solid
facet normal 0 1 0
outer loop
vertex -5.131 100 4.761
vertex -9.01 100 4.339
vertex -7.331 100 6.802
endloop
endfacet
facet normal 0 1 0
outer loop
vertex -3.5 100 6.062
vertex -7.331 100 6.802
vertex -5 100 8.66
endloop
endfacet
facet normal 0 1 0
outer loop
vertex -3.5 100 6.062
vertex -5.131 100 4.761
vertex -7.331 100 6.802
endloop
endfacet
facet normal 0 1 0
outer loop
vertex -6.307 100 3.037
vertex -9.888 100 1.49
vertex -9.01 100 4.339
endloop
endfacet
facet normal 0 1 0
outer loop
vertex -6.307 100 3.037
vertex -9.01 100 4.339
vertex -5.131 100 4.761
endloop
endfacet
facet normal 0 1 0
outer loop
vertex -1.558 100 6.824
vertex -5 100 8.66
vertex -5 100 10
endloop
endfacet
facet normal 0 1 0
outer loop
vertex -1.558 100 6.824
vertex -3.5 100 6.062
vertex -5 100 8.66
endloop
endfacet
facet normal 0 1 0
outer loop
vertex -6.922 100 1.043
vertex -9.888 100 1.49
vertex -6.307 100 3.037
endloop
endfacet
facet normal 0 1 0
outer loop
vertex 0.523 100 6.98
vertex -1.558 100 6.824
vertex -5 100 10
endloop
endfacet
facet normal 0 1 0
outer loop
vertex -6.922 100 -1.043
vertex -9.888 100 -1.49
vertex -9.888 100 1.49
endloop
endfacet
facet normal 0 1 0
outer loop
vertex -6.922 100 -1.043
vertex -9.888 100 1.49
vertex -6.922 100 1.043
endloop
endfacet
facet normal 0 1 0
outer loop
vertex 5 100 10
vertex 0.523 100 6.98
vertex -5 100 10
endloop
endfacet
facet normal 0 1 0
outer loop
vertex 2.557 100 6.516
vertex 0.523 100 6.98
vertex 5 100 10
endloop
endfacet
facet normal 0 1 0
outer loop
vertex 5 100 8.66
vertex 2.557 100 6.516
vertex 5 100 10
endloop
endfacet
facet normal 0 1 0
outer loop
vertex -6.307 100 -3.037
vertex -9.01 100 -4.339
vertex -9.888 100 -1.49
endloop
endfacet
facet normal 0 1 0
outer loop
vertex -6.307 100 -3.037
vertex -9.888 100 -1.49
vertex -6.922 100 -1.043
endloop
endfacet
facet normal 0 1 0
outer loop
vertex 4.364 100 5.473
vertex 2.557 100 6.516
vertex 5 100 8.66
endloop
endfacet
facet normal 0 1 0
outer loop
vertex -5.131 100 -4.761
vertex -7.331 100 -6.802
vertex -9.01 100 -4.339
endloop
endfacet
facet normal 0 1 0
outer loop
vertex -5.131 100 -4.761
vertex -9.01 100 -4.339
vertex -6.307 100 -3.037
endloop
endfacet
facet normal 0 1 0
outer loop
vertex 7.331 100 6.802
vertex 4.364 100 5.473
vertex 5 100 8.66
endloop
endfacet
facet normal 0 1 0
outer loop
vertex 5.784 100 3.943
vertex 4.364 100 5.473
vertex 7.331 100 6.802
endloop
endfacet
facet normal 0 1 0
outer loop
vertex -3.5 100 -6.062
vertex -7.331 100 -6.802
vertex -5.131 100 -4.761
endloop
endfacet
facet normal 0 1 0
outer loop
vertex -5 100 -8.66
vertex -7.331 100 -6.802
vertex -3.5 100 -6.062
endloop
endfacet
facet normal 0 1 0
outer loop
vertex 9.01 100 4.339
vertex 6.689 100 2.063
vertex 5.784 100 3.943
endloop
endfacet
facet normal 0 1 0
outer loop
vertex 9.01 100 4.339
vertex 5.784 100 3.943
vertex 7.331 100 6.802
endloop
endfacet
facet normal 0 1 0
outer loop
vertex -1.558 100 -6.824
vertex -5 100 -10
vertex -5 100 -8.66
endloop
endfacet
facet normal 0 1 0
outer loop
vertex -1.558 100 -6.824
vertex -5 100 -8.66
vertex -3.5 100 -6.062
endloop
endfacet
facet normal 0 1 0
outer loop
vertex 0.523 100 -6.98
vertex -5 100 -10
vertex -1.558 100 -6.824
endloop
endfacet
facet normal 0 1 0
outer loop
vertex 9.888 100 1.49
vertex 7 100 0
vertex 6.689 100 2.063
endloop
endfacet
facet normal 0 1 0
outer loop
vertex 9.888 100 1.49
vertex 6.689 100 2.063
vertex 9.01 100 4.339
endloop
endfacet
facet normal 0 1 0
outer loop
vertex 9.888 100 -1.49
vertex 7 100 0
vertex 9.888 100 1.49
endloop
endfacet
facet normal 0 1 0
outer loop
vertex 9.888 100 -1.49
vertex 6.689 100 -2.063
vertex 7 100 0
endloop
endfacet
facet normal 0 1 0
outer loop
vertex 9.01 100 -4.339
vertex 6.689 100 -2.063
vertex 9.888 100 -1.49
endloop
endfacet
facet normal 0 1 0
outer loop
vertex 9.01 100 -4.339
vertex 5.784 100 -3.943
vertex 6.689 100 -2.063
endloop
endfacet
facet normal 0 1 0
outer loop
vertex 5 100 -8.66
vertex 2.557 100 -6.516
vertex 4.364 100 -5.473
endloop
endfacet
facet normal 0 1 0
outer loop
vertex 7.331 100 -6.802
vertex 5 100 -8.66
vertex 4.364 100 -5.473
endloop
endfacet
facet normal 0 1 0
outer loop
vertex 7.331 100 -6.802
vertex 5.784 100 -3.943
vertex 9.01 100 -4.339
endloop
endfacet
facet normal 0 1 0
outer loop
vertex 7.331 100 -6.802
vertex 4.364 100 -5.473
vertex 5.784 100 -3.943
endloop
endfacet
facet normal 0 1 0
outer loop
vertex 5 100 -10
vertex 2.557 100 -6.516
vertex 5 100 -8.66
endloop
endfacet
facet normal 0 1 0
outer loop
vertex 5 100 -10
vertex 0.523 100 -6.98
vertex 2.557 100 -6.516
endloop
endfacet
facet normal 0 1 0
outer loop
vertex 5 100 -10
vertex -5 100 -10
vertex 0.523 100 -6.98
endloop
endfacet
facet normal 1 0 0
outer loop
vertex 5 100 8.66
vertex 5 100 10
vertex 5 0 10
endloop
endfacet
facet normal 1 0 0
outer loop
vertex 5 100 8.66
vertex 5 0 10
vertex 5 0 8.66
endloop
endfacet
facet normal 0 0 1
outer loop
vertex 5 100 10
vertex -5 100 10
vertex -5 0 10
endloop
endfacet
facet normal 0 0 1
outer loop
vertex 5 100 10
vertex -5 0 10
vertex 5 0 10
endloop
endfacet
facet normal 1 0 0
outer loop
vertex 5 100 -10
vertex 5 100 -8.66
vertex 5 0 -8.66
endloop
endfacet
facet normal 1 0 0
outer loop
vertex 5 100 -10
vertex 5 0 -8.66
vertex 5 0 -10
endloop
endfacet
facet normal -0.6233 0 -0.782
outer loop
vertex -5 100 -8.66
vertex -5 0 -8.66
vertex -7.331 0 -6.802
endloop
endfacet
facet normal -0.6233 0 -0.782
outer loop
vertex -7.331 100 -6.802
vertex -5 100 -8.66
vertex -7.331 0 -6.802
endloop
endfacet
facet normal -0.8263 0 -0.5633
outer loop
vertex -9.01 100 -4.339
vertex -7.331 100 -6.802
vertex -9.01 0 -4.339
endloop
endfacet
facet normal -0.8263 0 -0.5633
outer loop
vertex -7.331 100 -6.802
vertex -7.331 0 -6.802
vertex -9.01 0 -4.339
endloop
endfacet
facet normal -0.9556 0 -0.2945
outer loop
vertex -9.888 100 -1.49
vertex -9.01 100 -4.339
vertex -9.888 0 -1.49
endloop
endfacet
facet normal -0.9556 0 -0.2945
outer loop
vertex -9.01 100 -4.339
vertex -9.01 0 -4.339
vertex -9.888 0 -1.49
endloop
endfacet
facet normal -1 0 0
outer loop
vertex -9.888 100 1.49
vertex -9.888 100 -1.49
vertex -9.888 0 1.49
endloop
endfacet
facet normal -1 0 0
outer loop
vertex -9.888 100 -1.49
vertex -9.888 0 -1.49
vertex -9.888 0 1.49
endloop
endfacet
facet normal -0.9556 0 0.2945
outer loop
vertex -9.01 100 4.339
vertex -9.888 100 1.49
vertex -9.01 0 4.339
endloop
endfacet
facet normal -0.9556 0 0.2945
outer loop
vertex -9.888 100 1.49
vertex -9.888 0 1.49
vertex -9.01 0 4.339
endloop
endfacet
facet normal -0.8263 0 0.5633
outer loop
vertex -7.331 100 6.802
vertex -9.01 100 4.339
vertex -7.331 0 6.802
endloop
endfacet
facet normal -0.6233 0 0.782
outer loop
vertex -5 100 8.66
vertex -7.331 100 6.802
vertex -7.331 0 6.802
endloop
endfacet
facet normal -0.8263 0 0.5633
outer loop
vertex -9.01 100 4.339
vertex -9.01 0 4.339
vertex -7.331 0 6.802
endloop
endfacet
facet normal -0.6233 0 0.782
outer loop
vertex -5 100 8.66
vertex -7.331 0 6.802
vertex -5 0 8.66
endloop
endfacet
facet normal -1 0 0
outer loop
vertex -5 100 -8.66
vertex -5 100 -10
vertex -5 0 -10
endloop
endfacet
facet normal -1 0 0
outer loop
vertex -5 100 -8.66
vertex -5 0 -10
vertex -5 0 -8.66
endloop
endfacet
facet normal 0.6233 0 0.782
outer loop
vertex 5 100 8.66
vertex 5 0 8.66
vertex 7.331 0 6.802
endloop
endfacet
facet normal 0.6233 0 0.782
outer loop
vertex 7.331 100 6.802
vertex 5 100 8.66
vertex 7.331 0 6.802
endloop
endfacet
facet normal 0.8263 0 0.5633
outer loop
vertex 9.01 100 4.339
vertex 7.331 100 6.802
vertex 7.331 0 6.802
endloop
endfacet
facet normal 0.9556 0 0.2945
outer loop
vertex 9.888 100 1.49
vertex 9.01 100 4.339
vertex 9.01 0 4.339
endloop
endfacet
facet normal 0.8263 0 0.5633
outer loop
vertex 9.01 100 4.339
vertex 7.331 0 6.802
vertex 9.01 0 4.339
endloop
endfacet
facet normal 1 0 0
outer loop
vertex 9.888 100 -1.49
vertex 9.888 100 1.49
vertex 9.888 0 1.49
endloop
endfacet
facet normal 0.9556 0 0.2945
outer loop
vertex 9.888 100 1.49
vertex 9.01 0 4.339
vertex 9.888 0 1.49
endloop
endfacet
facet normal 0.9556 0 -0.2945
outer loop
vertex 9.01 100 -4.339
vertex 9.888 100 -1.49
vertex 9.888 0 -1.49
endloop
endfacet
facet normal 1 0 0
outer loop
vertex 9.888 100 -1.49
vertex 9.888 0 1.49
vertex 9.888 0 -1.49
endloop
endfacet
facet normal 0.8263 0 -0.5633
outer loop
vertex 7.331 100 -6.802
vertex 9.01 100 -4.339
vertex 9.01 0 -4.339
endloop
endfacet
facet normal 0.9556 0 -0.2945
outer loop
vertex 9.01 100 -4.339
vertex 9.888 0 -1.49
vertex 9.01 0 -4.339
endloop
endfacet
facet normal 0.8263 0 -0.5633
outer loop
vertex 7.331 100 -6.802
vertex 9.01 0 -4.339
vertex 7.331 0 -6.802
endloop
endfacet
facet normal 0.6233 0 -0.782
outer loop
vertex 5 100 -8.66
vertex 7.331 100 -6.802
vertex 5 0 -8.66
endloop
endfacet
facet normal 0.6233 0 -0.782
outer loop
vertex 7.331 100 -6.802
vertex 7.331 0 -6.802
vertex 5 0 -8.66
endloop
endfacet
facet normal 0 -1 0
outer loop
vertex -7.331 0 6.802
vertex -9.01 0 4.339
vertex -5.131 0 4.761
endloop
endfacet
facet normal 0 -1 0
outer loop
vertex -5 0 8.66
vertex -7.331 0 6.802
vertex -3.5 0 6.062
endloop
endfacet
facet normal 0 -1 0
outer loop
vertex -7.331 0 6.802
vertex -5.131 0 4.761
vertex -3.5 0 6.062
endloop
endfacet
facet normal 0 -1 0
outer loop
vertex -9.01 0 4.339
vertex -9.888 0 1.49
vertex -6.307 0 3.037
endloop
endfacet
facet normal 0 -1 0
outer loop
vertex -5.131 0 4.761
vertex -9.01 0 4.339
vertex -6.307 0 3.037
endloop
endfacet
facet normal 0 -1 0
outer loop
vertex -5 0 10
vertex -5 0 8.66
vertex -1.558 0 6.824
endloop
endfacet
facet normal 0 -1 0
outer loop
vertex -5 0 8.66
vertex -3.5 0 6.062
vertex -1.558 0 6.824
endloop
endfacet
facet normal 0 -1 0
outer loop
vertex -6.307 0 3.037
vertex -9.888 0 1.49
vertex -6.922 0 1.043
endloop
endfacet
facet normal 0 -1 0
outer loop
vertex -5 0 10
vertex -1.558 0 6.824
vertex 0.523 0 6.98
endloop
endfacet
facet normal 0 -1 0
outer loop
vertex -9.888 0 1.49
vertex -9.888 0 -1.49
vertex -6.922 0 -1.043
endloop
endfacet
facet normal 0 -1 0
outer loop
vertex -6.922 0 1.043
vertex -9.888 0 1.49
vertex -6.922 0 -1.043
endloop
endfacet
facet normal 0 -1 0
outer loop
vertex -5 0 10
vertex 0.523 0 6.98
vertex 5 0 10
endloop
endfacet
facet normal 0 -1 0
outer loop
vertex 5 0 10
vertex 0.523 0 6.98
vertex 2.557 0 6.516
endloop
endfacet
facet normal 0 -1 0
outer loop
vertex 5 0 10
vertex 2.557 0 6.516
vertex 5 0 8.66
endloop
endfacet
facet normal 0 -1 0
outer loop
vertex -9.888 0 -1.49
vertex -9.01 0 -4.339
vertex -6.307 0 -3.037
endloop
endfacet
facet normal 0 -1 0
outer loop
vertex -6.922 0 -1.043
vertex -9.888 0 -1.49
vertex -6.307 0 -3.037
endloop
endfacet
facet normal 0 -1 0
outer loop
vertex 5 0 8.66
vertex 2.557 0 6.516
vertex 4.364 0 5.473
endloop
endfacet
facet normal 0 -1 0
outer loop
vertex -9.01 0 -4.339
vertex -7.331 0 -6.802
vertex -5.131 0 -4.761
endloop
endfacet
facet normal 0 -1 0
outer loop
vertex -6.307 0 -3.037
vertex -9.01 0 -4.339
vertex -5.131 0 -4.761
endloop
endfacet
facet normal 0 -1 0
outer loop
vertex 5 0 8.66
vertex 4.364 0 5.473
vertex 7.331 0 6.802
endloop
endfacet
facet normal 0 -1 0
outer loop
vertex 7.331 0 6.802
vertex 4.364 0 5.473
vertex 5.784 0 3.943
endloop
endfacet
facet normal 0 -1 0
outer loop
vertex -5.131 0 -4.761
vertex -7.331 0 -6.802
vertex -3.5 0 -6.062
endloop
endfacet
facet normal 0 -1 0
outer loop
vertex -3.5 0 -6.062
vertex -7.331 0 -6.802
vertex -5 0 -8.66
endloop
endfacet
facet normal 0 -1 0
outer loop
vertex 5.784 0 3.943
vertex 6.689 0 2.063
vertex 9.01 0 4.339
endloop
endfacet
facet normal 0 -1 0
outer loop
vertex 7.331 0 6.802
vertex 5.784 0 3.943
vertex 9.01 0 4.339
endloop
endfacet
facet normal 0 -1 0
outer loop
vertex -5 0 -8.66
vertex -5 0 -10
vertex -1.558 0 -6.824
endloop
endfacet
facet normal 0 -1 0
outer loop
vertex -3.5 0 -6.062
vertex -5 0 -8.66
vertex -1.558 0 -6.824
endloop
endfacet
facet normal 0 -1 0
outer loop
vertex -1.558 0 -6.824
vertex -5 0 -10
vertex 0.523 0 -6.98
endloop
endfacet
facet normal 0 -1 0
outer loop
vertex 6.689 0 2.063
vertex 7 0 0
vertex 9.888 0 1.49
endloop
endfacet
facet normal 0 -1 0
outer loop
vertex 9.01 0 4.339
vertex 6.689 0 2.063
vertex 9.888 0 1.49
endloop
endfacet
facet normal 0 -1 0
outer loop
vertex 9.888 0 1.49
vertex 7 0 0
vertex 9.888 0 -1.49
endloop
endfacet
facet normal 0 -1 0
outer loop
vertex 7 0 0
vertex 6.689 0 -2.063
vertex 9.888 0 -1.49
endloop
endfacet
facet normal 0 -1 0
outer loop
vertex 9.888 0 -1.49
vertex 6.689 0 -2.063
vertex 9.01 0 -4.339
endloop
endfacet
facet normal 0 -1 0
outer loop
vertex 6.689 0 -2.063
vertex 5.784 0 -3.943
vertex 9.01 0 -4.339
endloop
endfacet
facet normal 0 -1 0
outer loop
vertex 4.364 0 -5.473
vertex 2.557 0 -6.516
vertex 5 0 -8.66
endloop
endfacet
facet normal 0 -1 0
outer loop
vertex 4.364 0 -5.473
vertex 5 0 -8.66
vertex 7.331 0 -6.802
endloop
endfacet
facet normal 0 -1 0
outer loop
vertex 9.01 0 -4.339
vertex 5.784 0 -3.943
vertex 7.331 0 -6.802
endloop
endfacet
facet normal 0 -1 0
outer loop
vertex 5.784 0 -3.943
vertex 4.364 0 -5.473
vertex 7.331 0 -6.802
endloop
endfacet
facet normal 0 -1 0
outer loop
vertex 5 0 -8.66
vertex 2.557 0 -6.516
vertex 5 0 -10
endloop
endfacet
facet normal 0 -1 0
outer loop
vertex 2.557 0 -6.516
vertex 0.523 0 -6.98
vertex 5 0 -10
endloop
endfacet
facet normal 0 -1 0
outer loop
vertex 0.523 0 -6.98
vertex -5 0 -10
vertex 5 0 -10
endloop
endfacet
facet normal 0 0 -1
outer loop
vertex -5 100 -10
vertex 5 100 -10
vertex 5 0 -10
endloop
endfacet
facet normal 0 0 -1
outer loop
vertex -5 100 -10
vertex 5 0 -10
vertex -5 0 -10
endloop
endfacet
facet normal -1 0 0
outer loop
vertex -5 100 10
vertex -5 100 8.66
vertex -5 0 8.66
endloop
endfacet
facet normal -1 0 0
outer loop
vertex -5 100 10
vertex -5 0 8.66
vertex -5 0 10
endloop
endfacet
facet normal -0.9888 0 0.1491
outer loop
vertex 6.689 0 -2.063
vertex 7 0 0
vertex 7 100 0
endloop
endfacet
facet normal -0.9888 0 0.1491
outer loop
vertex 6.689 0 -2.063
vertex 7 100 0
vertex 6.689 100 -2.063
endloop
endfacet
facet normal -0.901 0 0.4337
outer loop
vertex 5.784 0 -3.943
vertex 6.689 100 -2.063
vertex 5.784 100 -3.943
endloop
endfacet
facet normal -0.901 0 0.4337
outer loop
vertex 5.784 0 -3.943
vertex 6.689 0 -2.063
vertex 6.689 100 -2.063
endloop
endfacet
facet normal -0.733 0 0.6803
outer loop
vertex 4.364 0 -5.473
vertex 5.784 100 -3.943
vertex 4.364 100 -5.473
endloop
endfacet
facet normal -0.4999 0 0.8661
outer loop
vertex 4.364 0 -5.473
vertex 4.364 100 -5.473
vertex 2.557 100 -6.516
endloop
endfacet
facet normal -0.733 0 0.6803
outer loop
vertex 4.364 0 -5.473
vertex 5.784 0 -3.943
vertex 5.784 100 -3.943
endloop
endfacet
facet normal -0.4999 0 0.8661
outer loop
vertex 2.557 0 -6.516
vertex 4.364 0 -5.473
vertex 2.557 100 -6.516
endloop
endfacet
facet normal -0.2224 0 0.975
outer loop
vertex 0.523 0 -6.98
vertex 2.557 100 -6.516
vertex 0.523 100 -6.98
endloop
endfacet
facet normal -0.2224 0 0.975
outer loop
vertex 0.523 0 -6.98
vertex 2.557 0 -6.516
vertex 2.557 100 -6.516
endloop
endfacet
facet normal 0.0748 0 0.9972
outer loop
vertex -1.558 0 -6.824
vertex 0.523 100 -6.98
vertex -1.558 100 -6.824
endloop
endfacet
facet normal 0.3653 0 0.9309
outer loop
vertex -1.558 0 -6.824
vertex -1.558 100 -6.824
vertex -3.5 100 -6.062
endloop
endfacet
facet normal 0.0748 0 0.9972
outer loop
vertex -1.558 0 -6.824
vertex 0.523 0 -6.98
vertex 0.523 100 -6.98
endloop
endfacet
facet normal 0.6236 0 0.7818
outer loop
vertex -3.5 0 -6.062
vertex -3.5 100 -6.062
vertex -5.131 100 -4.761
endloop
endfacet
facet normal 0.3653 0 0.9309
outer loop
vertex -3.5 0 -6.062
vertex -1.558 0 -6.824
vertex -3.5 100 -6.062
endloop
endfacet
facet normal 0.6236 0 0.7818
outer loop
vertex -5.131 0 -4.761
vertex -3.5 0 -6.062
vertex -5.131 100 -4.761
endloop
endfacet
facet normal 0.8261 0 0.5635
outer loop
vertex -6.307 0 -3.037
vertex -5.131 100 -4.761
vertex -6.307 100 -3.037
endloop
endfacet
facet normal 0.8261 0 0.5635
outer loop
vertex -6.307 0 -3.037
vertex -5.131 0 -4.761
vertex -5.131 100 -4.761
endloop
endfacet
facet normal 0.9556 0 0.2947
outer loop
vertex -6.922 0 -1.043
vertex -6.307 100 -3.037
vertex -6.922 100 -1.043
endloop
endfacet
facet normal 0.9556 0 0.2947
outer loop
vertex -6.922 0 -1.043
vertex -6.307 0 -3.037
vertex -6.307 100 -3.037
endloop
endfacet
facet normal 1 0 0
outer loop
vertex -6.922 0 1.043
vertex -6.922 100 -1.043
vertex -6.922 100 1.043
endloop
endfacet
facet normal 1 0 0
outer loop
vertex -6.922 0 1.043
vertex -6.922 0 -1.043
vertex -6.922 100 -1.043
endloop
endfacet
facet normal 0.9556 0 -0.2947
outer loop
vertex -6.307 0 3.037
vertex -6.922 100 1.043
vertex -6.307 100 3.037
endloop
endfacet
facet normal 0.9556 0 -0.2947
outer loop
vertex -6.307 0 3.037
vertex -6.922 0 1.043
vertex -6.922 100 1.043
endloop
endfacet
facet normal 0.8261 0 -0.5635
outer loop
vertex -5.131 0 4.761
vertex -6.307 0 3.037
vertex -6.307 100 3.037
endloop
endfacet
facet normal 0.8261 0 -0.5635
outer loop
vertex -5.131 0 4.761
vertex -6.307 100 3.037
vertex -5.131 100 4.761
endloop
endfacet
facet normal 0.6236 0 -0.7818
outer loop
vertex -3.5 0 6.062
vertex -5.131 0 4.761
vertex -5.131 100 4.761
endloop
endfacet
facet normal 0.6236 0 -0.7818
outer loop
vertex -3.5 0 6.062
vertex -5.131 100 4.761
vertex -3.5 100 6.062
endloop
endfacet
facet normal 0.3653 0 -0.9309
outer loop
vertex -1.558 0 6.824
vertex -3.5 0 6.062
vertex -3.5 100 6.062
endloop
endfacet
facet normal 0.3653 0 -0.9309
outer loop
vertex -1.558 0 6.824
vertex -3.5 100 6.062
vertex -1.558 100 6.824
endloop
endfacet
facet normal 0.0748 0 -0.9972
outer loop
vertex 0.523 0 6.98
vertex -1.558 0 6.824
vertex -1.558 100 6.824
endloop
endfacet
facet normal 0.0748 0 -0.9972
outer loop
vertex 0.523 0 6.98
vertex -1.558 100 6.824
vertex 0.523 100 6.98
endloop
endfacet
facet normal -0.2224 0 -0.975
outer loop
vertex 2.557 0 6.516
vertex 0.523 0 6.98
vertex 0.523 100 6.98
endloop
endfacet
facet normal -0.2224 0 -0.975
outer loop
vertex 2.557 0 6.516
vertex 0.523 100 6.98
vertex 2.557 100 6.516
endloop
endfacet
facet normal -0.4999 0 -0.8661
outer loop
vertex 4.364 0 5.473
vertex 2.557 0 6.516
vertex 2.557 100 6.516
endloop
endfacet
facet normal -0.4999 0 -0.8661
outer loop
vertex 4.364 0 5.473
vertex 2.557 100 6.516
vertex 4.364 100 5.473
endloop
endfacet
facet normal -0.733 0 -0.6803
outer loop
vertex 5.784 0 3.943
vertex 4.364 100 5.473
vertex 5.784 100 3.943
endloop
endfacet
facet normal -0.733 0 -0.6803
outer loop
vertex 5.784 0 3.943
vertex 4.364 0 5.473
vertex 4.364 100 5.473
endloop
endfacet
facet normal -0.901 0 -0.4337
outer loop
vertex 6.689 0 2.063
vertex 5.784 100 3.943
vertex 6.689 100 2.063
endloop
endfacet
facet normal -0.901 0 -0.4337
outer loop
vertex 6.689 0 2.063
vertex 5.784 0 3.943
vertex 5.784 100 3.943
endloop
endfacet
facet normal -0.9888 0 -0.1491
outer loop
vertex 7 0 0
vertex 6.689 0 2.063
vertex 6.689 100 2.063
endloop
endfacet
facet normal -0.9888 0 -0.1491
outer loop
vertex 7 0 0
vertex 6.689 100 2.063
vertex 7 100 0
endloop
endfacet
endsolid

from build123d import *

# Parameters (mm, degrees)
SKETCH1_R           = 10
SKETCH1_R_2         = 7
BOSS_EXTRUDE1_DEPTH = 100
BOSS_EXTRUDE2_DEPTH = 100


with BuildPart() as part:
    # Sketch1 → Boss-Extrude1 (new body)
    with BuildSketch(Plane(origin=(0, 0, 0), x_dir=(1, 0, 0), z_dir=(0, 1, 0))):
        Circle(SKETCH1_R)
        Circle(SKETCH1_R_2, mode=Mode.SUBTRACT)
    extrude(amount=BOSS_EXTRUDE1_DEPTH)

    # Sketch2 → Boss-Extrude2 (add)
    with BuildSketch(Plane(origin=(0, 100, 0), x_dir=(1, 0, 0), z_dir=(0, 1, 0))):
        with BuildLine():
            Line((0, 10), (-5, 10))
            Line((-5, 10), (-5, 8.660254038))
            ThreePointArc((-5, 8.660254038), (-2.588190451, 9.659258263), (0, 10))
        make_face()
        with BuildLine():
            Line((5, 10), (0, 10))
            ThreePointArc((0, 10), (2.588190451, 9.659258263), (5, 8.660254038))
            Line((5, 8.660254038), (5, 10))
        make_face()
        with BuildLine():
            ThreePointArc((-1.3e-08, -10), (-2.588190457, -9.659258261), (-5, -8.660254038))
            Line((-5, -8.660254038), (-5, -10))
            Line((-5, -10), (-1.3e-08, -10))
        make_face()
        with BuildLine():
            Line((5, -10), (5, -8.660254038))
            ThreePointArc((5, -8.660254038), (2.588190445, -9.659258265), (-1.3e-08, -10))
            Line((-1.3e-08, -10), (5, -10))
        make_face()
    extrude(amount=-BOSS_EXTRUDE2_DEPTH)


solid = part.part
